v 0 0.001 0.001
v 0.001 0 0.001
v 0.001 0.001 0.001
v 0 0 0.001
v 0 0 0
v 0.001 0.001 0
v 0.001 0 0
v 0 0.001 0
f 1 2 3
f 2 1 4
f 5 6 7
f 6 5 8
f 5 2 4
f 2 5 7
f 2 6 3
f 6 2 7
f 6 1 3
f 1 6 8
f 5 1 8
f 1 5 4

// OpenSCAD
// file: ../src/ut_math.scad
// ut_math — the handful of functions that replace 1035 lines of vendored
// maths.scad and vector.scad. See docs/developer/history.md §5.

// clang-format off
use <ut_core.scad>;
// clang-format on

function ut_unit(v) = v / norm(v);

// The angle between two 3D vectors, in degrees, ALWAYS via atan2.
// 3D only: cross() requires 3-vectors. For planar angles use atan2(y, x).
// NEVER acos: acos(1.0000001) is nan on OpenSCAD 2021.01 and near-collinear
// waypoints are the most common input there is. See AGENTS.md rule 7.
function ut_turn(a, b) = atan2(norm(cross(a, b)), a *b);

// Rodrigues' rotation of v about unit axis k by ang degrees.
// This is reference/axford/half_curvedPipe.scad:19, generalised. docs/developer/history.md §2.
function ut_rotv(v, ang, k) = v * cos(ang) + cross(k, v) * sin(ang) + k * (k * v) * (1 - cos(ang));

// Project ref orthogonal to t and normalise -- the roll-reference seed.
// Falls back from UP to BACK when the run starts parallel to ref, which is the
// vertical-tangent NaN that has killed every previous attempt at this.
function ut_ref_fallback(t, ref = undef) = let(r0 = is_undef(ref) ? ut_up() : ref, tu = ut_unit(t),
                                               r = norm(cross(tu, r0)) < 1e-6
                                                       ? (norm(cross(tu, ut_back())) < 1e-6 ? [ 1, 0, 0 ] : ut_back())
                                                       : r0) ut_unit(r - tu * (r * tu));

// Re-orthogonalise n against t, preserving n's direction as closely as possible.
function ut_ortho(t, n) = let(tu = ut_unit(t), p = n - tu * (n * tu)) ut_unit(p);

// OpenSCAD's own $fn/$fa/$fs rule, applied per-radius and scaled to a partial
// sweep. This is why an arc-native IR gives better meshes than a sampled one:
// each bend gets facets from ITS OWN radius.
function ut_fragments(r, ang = 360) = let(full = $fn > 0 ? max($fn, 3) : ceil(max(min(360 / $fa, r * 2 * PI / $fs), 5)))
    max(2, ceil(full *abs(ang) / 360));

// The inradius of the polyhedron OpenSCAD actually emits for sphere(r) -- the
// distance to its nearest FACE, not to its vertices, which sit on r.
//
// A sphere is faceted in two directions at once, so it loses cos(180/n) twice.
// Verified against the emitted mesh: EXACT for n >= 8 (8.5355, 9.3301, 9.8296,
// 9.9039, 9.9572 at n = 8, 12, 24, 32, 48 for r=10) and conservative below it
// (6.545 modelled vs 7.330 actual at n=5). Erring low is the safe direction for
// anything that has to fit inside the result.
function ut_sphere_inradius(r) = let(n = ut_fragments(r, 360)) r * pow(cos(180 / n), 2);

// A closed CCW polygon of n points on a circle of radius r, sampled by ANGLE.
// Angle-sampling is what makes two loops correspondence-aligned (PROF-2 /
// ADR 0006); sampling by arclength does not, and self-intersects the end caps.
function ut_ring(r, n, a0 = 0) = [for (i = [0:n - 1]) let(a = a0 + 360 * i / n)[r * cos(a), r *sin(a)]];

// The largest circle centred on the origin that fits inside a closed 2D loop.
//
// This is the distance to the EDGES, not to the vertices. For a polygon they are
// different by cos(180/n), and using the vertices overstates the answer at every
// resolution -- ut_ring() puts its points exactly on the nominal circle, so a
// vertex-based "inradius" returns the nominal radius forever while the real
// inscribed circle is smaller. That overstatement let a joint's subtracted core
// sphere punch through a run's outer wall at coarse $fn, silently.
//
// Distance is taken to the edge's infinite LINE. For a non-convex loop the
// perpendicular foot can fall outside the segment, so this UNDER-estimates --
// which is the safe direction for anything that gets subtracted.
function ut_inradius(loop) = min([for (i = [0:len(loop) - 1]) _ut_edge_dist(loop, i)]);
function _ut_edge_dist(p, i) = let(a = p[i], b = p[(i + 1) % len(p)], d = b - a, L = norm(d)) L < ut_eps()
                                   ? norm(a)
                                   : abs(a[0] * d[1] - a[1] * d[0]) / L;

// Signed area of a 2D polygon. Positive = counter-clockwise.
function ut_area2d(poly) = let(n = len(poly)) 0.5 * _ut_area_sum(poly, n, 0);
function _ut_area_sum(p, n, i) = i >= n ? 0
                                        : (p[i][0] * p[(i + 1) % n][1] - p[(i + 1) % n][0] * p[i][1]) +
                                              _ut_area_sum(p, n, i + 1);

// Volume of a closed triangulated mesh by the divergence theorem.
// Replaces BOSL2's vnf_volume(). Verified exact to 6 s.f. against analytic
// values in Phase 0 -- see ADR 0001.
function ut_volume(pts, faces) = _ut_vol(pts, faces, 0);
function _ut_vol(P, F, i) = i >= len(F) ? 0 : _ut_face_vol(P, F[i]) + _ut_vol(P, F, i + 1);
function _ut_face_vol(P, f) = _ut_fan(P, f, 1);
function _ut_fan(P, f, k) = k > len(f) - 2 ? 0 : (P[f[0]] * cross(P[f[k]], P[f[k + 1]])) / 6 + _ut_fan(P, f, k + 1);
// file: ../src/ut_core.scad
// ut_core — shared constants, record access, and assertion helpers.
//
// NOTE, verified on 2021.01: `use <>` does not export top-level VARIABLES at
// all, and it does not re-export transitively either -- see src/uniTube.scad for
// why the entry point is the one file that `include`s. Every shared constant in
// this library is therefore a zero-argument FUNCTION, not a variable.

function ut_eps() = 1e-9;
function ut_min_wall() = 1.2; // ~3 perimeters on a 0.4 nozzle; a warning, not an error

function ut_up() = [ 0, 0, 1 ];
function ut_back() = [ 0, 1, 0 ];

// --- association lists: opts = [["key", value], ...] --------------------------
function ut_opt(opts, key, dflt = undef) = let(hit = [for (e = opts) if (e[0] == key) e[1]]) len(hit) > 0 ? hit[0]
                                                                                                          : dflt;

// --- tagged records -----------------------------------------------------------
// Every record is ["tag", ...fields]. User code reads them through accessors,
// never by index, so a field can be added without invalidating existing values.
// The accessors live beside their constructors; there is no generic reader here,
// because nothing ever needed to ask a record what it was.

// --- assertion helper ---------------------------------------------------------
// Usage: function f(x) = ut_req(x > 0, str("f(): x must be positive, got ", x)) x * 2;
// Returns true when the condition holds so it can prefix an expression.
function ut_req(cond, msg) = assert(cond, msg) true;
// main file
// t_math — the primitives everything else rests on.

// clang-format off
use <../src/ut_core.scad>;
use <../src/ut_math.scad>;
// clang-format on

// --- ut_turn: the acos replacement (AGENTS.md rule 7, docs/developer/history.md §3) -----
assert(abs(ut_turn([ 1, 0, 0 ], [ 0, 1, 0 ]) - 90) < 1e-9, "ut_turn: orthogonal -> 90");
assert(abs(ut_turn([ 1, 0, 0 ], [ 1, 0, 0 ])) < 1e-9, "ut_turn: identical -> 0");
assert(abs(ut_turn([ 1, 0, 0 ], [ -1, 0, 0 ]) - 180) < 1e-9, "ut_turn: opposed -> 180");
assert(abs(ut_turn([ 2, 0, 0 ], [ 0, 5, 0 ]) - 90) < 1e-9, "ut_turn: magnitude-independent");
assert(is_num(ut_turn([ 1, 0, 0 ], [ 1, 1e-9, 0 ])), "ut_turn: must not NaN on near-collinear input");
assert(!is_num(acos(1.0000001)), "acos past 1.0 is nan on 2021.01 -- the bug ut_turn exists to avoid");

// --- ut_rotv: Rodrigues -------------------------------------------------------
assert(norm(ut_rotv([ 1, 0, 0 ], 90, [ 0, 0, 1 ]) - [ 0, 1, 0 ]) < 1e-9, "ut_rotv: x about z by 90 -> y");
assert(norm(ut_rotv([ 0, 0, 1 ], 90, [ 0, 0, 1 ]) - [ 0, 0, 1 ]) < 1e-9,
       "ut_rotv: a vector PARALLEL to the axis is invariant -- this is why a planar bend has zero twist");
assert(abs(norm(ut_rotv([ 1, 2, 3 ], 37, ut_unit([ 1, 1, 0 ]))) - norm([ 1, 2, 3 ])) < 1e-9,
       "ut_rotv: rotation preserves length");

// --- ut_ref_fallback: the vertical-tangent NaN --------------------------------
assert(norm(ut_ref_fallback([ 1, 0, 0 ]) - [ 0, 0, 1 ]) < 1e-9, "ut_ref_fallback: horizontal run seeds UP");
n_vert = ut_ref_fallback([ 0, 0, 1 ]);
assert(is_num(n_vert[0]) && is_num(n_vert[1]) && is_num(n_vert[2]),
       "ut_ref_fallback: a VERTICAL run must not produce NaN -- UP is parallel to the tangent there");
assert(abs(norm(n_vert) - 1) < 1e-9, "ut_ref_fallback: result is a unit vector");
assert(abs(n_vert * [ 0, 0, 1 ]) < 1e-9, "ut_ref_fallback: result is orthogonal to the tangent");

// --- ut_ring: angle sampling, the basis of PROF-2 (ADR 0006) -----------------
r8 = ut_ring(5, 8);
assert(len(r8) == 8, "ut_ring: point count");
assert(abs(norm(r8[0]) - 5) < 1e-9, "ut_ring: radius");
assert(ut_area2d(r8) > 0, "ut_ring: counter-clockwise (positive signed area)");
assert(ut_area2d([for (i = [len(r8) - 1:-1:0]) r8[i]]) < 0, "ut_area2d: reversed loop is negative");
// Correspondence: two rings of different radius agree in ANGLE at every index.
// (ut_turn is 3D-only -- cross() needs 3-vectors -- so compare planar angles.)
a = ut_ring(10, 8);
b = ut_ring(4, 8);
assert(max([for (i = [0:7]) abs(atan2(a[i][1], a[i][0]) - atan2(b[i][1], b[i][0]))]) < 1e-9,
       "PROF-2: rings of different radii must be angle-aligned index-for-index");

// --- ut_fragments -------------------------------------------------------------
assert(ut_fragments(15, 90, $fn = 0, $fa = 12, $fs = 2) == 8, "ut_fragments: r=15 over 90deg at default $fa/$fs");
assert(ut_fragments(15, 360, $fn = 64) == 64, "ut_fragments: explicit $fn, full circle");
assert(ut_fragments(15, 90, $fn = 64) == 16, "ut_fragments: explicit $fn scales with sweep");
assert(ut_fragments(1000, 1) >= 2, "ut_fragments: never fewer than 2 per segment");

// --- ut_volume ----------------------------------------------------------------
// Unit cube as 12 triangles, outward-facing.
cp = [ [ 0, 0, 0 ], [ 1, 0, 0 ], [ 1, 1, 0 ], [ 0, 1, 0 ], [ 0, 0, 1 ], [ 1, 0, 1 ], [ 1, 1, 1 ], [ 0, 1, 1 ] ];
cf = [
    [ 0, 3, 2 ], [ 0, 2, 1 ], [ 4, 5, 6 ], [ 4, 6, 7 ], [ 0, 1, 5 ], [ 0, 5, 4 ], [ 1, 2, 6 ], [ 1, 6, 5 ], [ 2, 3, 7 ],
    [ 2, 7, 6 ], [ 3, 0, 4 ], [ 3, 4, 7 ]
];
assert(abs(ut_volume(cp, cf) - 1) < 1e-9, "ut_volume: unit cube must measure exactly 1");

// ============================================ inradius: EDGES, not vertices
// ut_ring puts every point exactly on the nominal circle, so a vertex-based
// "inradius" returns the nominal radius at every resolution while the real
// inscribed circle is smaller by cos(180/n). That overstatement sized a
// subtracted sphere and put a hole through a junction.
for (n = [ 5, 6, 8, 12, 24, 64 ])
{
    let(ring = ut_ring(10, n), want = 10 * cos(180 / n))
    {
        assert(abs(max([for (q = ring) norm(q)]) - 10) < 1e-9,
               "the vertices are on the nominal circle -- that is the trap");
        assert(abs(ut_inradius(ring) - want) < 1e-9,
               str("ut_inradius at n=", n, ": expected ", want, " got ", ut_inradius(ring)));
        assert(ut_inradius(ring) <= 10 + 1e-9, "the inradius never exceeds the circumradius");
    }
}
// A square, where the answer is known by inspection: circumradius 10*sqrt(2),
// inradius exactly 10.
sq = [ [ 10, 10 ], [ -10, 10 ], [ -10, -10 ], [ 10, -10 ] ];
assert(abs(ut_inradius(sq) - 10) < 1e-9, str("square inradius must be 10, got ", ut_inradius(sq)));

// ============================================ the sphere OpenSCAD actually emits
// A sphere is faceted in two directions, so it loses cos(180/n) twice. Measured
// against the emitted mesh: exact for n >= 8, conservative below.
for (t = [ [ 8, 8.5355 ], [ 12, 9.3301 ], [ 24, 9.8296 ], [ 32, 9.9039 ], [ 48, 9.9572 ] ])
{
    let(got = ut_sphere_inradius(10, $fn = t[0]))
        assert(abs(got - t[1]) < 1e-3, str("sphere inradius at $fn=", t[0], ": expected ", t[1], " got ", got));
}
// Below n=8 it must UNDER-estimate -- erring low is the safe direction for
// anything that has to fit inside the result.
assert(ut_sphere_inradius(10, $fn = 5) < 7.33, "at $fn=5 the model must sit below the true 7.330");
assert(ut_sphere_inradius(10, $fn = 6) < 7.746, "at $fn=6 the model must sit below the true 7.746");

cube(0.001); // sentinel
